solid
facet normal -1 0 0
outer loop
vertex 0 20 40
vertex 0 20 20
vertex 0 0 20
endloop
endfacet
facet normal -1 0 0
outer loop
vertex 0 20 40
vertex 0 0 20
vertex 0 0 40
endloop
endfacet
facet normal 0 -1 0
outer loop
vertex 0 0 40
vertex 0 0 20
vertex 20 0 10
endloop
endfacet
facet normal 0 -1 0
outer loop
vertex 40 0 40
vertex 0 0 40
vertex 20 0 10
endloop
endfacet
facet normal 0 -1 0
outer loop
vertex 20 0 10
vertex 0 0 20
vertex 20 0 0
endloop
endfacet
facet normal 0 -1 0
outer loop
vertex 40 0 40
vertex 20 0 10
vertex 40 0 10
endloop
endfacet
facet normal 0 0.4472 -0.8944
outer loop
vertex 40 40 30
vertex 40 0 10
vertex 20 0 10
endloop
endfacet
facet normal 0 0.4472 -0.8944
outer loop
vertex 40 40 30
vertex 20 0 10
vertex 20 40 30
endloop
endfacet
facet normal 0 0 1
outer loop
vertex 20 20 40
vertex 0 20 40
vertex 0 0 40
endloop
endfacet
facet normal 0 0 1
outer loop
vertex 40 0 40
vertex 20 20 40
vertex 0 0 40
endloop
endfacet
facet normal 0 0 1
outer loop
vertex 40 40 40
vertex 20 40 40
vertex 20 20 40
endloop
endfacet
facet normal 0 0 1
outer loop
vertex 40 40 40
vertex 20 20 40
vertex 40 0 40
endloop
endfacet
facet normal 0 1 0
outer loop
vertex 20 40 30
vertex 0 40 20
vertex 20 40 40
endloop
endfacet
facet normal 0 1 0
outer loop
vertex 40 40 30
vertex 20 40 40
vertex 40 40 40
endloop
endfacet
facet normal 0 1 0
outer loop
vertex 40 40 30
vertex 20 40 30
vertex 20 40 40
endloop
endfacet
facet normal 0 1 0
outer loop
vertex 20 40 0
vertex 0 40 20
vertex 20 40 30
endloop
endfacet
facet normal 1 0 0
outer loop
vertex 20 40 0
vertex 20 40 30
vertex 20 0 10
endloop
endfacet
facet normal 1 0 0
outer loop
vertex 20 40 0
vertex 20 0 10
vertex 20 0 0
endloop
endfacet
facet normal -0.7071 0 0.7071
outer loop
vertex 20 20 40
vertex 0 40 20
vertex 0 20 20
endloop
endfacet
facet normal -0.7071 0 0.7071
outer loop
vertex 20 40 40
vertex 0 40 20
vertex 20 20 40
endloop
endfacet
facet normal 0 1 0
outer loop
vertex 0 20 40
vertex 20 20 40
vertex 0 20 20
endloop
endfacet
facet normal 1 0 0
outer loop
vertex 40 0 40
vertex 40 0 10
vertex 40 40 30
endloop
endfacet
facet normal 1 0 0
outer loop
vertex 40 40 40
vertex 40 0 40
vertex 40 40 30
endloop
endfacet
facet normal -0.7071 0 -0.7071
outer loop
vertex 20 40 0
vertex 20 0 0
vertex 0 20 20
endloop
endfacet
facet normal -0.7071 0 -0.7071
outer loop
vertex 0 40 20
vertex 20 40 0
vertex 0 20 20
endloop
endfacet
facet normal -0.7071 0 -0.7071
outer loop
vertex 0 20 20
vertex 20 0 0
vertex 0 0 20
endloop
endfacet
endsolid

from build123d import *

# Parameters (mm, degrees)
BOSS_EXTRUDE1_DEPTH  = 40
SKETCH2_W            = 20
SKETCH2_H            = 20
BOSS_EXTRUDE3_DEPTH  = 20
CUT_EXTRUDE2_DEPTH   = 20
SKETCH5_W            = 20
SKETCH5_H            = 10
CUT_EXTRUDE3_DEPTH   = 20
CUT_EXTRUDE4_DEPTH   = 52
CUT_EXTRUDE8_DEPTH   = 20
BOSS_EXTRUDE11_DEPTH = 20


with BuildPart() as part:
    # Sketch1 → Boss-Extrude1 (new body)
    with BuildSketch(Plane.XY):
        Polygon((20, 20), (0, 20), (0, 0), (40, 0), (40, 40), (20, 40), align=None)
    extrude(amount=BOSS_EXTRUDE1_DEPTH)

    # Sketch2 → Boss-Extrude3 (add)
    with BuildSketch(Plane.ZY.offset(-20)):
        with Locations((10, 30)):
            Rectangle(SKETCH2_W, SKETCH2_H)
    extrude(amount=BOSS_EXTRUDE3_DEPTH)

    # Sketch3 → Cut-Extrude2 (cut)
    with BuildSketch(Plane(origin=(40, 0, 0), x_dir=(0, 0, -1), z_dir=(1, 0, 0))):
        Polygon((0, 0), (-20, 40), (-30, 40), align=None)
        Polygon((0, 40), (-20, 40), (0, 0), align=None)
    extrude(amount=-CUT_EXTRUDE2_DEPTH, mode=Mode.SUBTRACT)

    # Sketch5 → Cut-Extrude3 (cut)
    with BuildSketch(Plane(origin=(0, 0, 0), x_dir=(-1, 0, 0), z_dir=(0, -1, 0))):
        with Locations((-30, -5)):
            Rectangle(SKETCH5_W, SKETCH5_H)
    extrude(amount=-CUT_EXTRUDE3_DEPTH, mode=Mode.SUBTRACT)

    # Sketch6 → Cut-Extrude4 (cut)
    with BuildSketch(Plane.XZ):
        Polygon((20, 0), (0, 20), (0, 0), align=None)
    extrude(amount=-CUT_EXTRUDE4_DEPTH, mode=Mode.SUBTRACT)

    # Sketch7 → Cut-Extrude8 (cut)
    with BuildSketch(Plane(origin=(40, 0, 0), x_dir=(0, 0, -1), z_dir=(1, 0, 0))):
        Polygon((-10, 0), (-30, 40), (-10, 13.333333333), align=None)
    extrude(amount=-CUT_EXTRUDE8_DEPTH, mode=Mode.SUBTRACT)

    # Sketch14 → Boss-Extrude11 (add)
    with BuildSketch(Plane(origin=(0, 40, 0), x_dir=(1, 0, 0), z_dir=(0, 1, 0))):
        Polygon((0, -20), (20, -40), (20, -20), align=None)
    extrude(amount=-BOSS_EXTRUDE11_DEPTH)


solid = part.part
